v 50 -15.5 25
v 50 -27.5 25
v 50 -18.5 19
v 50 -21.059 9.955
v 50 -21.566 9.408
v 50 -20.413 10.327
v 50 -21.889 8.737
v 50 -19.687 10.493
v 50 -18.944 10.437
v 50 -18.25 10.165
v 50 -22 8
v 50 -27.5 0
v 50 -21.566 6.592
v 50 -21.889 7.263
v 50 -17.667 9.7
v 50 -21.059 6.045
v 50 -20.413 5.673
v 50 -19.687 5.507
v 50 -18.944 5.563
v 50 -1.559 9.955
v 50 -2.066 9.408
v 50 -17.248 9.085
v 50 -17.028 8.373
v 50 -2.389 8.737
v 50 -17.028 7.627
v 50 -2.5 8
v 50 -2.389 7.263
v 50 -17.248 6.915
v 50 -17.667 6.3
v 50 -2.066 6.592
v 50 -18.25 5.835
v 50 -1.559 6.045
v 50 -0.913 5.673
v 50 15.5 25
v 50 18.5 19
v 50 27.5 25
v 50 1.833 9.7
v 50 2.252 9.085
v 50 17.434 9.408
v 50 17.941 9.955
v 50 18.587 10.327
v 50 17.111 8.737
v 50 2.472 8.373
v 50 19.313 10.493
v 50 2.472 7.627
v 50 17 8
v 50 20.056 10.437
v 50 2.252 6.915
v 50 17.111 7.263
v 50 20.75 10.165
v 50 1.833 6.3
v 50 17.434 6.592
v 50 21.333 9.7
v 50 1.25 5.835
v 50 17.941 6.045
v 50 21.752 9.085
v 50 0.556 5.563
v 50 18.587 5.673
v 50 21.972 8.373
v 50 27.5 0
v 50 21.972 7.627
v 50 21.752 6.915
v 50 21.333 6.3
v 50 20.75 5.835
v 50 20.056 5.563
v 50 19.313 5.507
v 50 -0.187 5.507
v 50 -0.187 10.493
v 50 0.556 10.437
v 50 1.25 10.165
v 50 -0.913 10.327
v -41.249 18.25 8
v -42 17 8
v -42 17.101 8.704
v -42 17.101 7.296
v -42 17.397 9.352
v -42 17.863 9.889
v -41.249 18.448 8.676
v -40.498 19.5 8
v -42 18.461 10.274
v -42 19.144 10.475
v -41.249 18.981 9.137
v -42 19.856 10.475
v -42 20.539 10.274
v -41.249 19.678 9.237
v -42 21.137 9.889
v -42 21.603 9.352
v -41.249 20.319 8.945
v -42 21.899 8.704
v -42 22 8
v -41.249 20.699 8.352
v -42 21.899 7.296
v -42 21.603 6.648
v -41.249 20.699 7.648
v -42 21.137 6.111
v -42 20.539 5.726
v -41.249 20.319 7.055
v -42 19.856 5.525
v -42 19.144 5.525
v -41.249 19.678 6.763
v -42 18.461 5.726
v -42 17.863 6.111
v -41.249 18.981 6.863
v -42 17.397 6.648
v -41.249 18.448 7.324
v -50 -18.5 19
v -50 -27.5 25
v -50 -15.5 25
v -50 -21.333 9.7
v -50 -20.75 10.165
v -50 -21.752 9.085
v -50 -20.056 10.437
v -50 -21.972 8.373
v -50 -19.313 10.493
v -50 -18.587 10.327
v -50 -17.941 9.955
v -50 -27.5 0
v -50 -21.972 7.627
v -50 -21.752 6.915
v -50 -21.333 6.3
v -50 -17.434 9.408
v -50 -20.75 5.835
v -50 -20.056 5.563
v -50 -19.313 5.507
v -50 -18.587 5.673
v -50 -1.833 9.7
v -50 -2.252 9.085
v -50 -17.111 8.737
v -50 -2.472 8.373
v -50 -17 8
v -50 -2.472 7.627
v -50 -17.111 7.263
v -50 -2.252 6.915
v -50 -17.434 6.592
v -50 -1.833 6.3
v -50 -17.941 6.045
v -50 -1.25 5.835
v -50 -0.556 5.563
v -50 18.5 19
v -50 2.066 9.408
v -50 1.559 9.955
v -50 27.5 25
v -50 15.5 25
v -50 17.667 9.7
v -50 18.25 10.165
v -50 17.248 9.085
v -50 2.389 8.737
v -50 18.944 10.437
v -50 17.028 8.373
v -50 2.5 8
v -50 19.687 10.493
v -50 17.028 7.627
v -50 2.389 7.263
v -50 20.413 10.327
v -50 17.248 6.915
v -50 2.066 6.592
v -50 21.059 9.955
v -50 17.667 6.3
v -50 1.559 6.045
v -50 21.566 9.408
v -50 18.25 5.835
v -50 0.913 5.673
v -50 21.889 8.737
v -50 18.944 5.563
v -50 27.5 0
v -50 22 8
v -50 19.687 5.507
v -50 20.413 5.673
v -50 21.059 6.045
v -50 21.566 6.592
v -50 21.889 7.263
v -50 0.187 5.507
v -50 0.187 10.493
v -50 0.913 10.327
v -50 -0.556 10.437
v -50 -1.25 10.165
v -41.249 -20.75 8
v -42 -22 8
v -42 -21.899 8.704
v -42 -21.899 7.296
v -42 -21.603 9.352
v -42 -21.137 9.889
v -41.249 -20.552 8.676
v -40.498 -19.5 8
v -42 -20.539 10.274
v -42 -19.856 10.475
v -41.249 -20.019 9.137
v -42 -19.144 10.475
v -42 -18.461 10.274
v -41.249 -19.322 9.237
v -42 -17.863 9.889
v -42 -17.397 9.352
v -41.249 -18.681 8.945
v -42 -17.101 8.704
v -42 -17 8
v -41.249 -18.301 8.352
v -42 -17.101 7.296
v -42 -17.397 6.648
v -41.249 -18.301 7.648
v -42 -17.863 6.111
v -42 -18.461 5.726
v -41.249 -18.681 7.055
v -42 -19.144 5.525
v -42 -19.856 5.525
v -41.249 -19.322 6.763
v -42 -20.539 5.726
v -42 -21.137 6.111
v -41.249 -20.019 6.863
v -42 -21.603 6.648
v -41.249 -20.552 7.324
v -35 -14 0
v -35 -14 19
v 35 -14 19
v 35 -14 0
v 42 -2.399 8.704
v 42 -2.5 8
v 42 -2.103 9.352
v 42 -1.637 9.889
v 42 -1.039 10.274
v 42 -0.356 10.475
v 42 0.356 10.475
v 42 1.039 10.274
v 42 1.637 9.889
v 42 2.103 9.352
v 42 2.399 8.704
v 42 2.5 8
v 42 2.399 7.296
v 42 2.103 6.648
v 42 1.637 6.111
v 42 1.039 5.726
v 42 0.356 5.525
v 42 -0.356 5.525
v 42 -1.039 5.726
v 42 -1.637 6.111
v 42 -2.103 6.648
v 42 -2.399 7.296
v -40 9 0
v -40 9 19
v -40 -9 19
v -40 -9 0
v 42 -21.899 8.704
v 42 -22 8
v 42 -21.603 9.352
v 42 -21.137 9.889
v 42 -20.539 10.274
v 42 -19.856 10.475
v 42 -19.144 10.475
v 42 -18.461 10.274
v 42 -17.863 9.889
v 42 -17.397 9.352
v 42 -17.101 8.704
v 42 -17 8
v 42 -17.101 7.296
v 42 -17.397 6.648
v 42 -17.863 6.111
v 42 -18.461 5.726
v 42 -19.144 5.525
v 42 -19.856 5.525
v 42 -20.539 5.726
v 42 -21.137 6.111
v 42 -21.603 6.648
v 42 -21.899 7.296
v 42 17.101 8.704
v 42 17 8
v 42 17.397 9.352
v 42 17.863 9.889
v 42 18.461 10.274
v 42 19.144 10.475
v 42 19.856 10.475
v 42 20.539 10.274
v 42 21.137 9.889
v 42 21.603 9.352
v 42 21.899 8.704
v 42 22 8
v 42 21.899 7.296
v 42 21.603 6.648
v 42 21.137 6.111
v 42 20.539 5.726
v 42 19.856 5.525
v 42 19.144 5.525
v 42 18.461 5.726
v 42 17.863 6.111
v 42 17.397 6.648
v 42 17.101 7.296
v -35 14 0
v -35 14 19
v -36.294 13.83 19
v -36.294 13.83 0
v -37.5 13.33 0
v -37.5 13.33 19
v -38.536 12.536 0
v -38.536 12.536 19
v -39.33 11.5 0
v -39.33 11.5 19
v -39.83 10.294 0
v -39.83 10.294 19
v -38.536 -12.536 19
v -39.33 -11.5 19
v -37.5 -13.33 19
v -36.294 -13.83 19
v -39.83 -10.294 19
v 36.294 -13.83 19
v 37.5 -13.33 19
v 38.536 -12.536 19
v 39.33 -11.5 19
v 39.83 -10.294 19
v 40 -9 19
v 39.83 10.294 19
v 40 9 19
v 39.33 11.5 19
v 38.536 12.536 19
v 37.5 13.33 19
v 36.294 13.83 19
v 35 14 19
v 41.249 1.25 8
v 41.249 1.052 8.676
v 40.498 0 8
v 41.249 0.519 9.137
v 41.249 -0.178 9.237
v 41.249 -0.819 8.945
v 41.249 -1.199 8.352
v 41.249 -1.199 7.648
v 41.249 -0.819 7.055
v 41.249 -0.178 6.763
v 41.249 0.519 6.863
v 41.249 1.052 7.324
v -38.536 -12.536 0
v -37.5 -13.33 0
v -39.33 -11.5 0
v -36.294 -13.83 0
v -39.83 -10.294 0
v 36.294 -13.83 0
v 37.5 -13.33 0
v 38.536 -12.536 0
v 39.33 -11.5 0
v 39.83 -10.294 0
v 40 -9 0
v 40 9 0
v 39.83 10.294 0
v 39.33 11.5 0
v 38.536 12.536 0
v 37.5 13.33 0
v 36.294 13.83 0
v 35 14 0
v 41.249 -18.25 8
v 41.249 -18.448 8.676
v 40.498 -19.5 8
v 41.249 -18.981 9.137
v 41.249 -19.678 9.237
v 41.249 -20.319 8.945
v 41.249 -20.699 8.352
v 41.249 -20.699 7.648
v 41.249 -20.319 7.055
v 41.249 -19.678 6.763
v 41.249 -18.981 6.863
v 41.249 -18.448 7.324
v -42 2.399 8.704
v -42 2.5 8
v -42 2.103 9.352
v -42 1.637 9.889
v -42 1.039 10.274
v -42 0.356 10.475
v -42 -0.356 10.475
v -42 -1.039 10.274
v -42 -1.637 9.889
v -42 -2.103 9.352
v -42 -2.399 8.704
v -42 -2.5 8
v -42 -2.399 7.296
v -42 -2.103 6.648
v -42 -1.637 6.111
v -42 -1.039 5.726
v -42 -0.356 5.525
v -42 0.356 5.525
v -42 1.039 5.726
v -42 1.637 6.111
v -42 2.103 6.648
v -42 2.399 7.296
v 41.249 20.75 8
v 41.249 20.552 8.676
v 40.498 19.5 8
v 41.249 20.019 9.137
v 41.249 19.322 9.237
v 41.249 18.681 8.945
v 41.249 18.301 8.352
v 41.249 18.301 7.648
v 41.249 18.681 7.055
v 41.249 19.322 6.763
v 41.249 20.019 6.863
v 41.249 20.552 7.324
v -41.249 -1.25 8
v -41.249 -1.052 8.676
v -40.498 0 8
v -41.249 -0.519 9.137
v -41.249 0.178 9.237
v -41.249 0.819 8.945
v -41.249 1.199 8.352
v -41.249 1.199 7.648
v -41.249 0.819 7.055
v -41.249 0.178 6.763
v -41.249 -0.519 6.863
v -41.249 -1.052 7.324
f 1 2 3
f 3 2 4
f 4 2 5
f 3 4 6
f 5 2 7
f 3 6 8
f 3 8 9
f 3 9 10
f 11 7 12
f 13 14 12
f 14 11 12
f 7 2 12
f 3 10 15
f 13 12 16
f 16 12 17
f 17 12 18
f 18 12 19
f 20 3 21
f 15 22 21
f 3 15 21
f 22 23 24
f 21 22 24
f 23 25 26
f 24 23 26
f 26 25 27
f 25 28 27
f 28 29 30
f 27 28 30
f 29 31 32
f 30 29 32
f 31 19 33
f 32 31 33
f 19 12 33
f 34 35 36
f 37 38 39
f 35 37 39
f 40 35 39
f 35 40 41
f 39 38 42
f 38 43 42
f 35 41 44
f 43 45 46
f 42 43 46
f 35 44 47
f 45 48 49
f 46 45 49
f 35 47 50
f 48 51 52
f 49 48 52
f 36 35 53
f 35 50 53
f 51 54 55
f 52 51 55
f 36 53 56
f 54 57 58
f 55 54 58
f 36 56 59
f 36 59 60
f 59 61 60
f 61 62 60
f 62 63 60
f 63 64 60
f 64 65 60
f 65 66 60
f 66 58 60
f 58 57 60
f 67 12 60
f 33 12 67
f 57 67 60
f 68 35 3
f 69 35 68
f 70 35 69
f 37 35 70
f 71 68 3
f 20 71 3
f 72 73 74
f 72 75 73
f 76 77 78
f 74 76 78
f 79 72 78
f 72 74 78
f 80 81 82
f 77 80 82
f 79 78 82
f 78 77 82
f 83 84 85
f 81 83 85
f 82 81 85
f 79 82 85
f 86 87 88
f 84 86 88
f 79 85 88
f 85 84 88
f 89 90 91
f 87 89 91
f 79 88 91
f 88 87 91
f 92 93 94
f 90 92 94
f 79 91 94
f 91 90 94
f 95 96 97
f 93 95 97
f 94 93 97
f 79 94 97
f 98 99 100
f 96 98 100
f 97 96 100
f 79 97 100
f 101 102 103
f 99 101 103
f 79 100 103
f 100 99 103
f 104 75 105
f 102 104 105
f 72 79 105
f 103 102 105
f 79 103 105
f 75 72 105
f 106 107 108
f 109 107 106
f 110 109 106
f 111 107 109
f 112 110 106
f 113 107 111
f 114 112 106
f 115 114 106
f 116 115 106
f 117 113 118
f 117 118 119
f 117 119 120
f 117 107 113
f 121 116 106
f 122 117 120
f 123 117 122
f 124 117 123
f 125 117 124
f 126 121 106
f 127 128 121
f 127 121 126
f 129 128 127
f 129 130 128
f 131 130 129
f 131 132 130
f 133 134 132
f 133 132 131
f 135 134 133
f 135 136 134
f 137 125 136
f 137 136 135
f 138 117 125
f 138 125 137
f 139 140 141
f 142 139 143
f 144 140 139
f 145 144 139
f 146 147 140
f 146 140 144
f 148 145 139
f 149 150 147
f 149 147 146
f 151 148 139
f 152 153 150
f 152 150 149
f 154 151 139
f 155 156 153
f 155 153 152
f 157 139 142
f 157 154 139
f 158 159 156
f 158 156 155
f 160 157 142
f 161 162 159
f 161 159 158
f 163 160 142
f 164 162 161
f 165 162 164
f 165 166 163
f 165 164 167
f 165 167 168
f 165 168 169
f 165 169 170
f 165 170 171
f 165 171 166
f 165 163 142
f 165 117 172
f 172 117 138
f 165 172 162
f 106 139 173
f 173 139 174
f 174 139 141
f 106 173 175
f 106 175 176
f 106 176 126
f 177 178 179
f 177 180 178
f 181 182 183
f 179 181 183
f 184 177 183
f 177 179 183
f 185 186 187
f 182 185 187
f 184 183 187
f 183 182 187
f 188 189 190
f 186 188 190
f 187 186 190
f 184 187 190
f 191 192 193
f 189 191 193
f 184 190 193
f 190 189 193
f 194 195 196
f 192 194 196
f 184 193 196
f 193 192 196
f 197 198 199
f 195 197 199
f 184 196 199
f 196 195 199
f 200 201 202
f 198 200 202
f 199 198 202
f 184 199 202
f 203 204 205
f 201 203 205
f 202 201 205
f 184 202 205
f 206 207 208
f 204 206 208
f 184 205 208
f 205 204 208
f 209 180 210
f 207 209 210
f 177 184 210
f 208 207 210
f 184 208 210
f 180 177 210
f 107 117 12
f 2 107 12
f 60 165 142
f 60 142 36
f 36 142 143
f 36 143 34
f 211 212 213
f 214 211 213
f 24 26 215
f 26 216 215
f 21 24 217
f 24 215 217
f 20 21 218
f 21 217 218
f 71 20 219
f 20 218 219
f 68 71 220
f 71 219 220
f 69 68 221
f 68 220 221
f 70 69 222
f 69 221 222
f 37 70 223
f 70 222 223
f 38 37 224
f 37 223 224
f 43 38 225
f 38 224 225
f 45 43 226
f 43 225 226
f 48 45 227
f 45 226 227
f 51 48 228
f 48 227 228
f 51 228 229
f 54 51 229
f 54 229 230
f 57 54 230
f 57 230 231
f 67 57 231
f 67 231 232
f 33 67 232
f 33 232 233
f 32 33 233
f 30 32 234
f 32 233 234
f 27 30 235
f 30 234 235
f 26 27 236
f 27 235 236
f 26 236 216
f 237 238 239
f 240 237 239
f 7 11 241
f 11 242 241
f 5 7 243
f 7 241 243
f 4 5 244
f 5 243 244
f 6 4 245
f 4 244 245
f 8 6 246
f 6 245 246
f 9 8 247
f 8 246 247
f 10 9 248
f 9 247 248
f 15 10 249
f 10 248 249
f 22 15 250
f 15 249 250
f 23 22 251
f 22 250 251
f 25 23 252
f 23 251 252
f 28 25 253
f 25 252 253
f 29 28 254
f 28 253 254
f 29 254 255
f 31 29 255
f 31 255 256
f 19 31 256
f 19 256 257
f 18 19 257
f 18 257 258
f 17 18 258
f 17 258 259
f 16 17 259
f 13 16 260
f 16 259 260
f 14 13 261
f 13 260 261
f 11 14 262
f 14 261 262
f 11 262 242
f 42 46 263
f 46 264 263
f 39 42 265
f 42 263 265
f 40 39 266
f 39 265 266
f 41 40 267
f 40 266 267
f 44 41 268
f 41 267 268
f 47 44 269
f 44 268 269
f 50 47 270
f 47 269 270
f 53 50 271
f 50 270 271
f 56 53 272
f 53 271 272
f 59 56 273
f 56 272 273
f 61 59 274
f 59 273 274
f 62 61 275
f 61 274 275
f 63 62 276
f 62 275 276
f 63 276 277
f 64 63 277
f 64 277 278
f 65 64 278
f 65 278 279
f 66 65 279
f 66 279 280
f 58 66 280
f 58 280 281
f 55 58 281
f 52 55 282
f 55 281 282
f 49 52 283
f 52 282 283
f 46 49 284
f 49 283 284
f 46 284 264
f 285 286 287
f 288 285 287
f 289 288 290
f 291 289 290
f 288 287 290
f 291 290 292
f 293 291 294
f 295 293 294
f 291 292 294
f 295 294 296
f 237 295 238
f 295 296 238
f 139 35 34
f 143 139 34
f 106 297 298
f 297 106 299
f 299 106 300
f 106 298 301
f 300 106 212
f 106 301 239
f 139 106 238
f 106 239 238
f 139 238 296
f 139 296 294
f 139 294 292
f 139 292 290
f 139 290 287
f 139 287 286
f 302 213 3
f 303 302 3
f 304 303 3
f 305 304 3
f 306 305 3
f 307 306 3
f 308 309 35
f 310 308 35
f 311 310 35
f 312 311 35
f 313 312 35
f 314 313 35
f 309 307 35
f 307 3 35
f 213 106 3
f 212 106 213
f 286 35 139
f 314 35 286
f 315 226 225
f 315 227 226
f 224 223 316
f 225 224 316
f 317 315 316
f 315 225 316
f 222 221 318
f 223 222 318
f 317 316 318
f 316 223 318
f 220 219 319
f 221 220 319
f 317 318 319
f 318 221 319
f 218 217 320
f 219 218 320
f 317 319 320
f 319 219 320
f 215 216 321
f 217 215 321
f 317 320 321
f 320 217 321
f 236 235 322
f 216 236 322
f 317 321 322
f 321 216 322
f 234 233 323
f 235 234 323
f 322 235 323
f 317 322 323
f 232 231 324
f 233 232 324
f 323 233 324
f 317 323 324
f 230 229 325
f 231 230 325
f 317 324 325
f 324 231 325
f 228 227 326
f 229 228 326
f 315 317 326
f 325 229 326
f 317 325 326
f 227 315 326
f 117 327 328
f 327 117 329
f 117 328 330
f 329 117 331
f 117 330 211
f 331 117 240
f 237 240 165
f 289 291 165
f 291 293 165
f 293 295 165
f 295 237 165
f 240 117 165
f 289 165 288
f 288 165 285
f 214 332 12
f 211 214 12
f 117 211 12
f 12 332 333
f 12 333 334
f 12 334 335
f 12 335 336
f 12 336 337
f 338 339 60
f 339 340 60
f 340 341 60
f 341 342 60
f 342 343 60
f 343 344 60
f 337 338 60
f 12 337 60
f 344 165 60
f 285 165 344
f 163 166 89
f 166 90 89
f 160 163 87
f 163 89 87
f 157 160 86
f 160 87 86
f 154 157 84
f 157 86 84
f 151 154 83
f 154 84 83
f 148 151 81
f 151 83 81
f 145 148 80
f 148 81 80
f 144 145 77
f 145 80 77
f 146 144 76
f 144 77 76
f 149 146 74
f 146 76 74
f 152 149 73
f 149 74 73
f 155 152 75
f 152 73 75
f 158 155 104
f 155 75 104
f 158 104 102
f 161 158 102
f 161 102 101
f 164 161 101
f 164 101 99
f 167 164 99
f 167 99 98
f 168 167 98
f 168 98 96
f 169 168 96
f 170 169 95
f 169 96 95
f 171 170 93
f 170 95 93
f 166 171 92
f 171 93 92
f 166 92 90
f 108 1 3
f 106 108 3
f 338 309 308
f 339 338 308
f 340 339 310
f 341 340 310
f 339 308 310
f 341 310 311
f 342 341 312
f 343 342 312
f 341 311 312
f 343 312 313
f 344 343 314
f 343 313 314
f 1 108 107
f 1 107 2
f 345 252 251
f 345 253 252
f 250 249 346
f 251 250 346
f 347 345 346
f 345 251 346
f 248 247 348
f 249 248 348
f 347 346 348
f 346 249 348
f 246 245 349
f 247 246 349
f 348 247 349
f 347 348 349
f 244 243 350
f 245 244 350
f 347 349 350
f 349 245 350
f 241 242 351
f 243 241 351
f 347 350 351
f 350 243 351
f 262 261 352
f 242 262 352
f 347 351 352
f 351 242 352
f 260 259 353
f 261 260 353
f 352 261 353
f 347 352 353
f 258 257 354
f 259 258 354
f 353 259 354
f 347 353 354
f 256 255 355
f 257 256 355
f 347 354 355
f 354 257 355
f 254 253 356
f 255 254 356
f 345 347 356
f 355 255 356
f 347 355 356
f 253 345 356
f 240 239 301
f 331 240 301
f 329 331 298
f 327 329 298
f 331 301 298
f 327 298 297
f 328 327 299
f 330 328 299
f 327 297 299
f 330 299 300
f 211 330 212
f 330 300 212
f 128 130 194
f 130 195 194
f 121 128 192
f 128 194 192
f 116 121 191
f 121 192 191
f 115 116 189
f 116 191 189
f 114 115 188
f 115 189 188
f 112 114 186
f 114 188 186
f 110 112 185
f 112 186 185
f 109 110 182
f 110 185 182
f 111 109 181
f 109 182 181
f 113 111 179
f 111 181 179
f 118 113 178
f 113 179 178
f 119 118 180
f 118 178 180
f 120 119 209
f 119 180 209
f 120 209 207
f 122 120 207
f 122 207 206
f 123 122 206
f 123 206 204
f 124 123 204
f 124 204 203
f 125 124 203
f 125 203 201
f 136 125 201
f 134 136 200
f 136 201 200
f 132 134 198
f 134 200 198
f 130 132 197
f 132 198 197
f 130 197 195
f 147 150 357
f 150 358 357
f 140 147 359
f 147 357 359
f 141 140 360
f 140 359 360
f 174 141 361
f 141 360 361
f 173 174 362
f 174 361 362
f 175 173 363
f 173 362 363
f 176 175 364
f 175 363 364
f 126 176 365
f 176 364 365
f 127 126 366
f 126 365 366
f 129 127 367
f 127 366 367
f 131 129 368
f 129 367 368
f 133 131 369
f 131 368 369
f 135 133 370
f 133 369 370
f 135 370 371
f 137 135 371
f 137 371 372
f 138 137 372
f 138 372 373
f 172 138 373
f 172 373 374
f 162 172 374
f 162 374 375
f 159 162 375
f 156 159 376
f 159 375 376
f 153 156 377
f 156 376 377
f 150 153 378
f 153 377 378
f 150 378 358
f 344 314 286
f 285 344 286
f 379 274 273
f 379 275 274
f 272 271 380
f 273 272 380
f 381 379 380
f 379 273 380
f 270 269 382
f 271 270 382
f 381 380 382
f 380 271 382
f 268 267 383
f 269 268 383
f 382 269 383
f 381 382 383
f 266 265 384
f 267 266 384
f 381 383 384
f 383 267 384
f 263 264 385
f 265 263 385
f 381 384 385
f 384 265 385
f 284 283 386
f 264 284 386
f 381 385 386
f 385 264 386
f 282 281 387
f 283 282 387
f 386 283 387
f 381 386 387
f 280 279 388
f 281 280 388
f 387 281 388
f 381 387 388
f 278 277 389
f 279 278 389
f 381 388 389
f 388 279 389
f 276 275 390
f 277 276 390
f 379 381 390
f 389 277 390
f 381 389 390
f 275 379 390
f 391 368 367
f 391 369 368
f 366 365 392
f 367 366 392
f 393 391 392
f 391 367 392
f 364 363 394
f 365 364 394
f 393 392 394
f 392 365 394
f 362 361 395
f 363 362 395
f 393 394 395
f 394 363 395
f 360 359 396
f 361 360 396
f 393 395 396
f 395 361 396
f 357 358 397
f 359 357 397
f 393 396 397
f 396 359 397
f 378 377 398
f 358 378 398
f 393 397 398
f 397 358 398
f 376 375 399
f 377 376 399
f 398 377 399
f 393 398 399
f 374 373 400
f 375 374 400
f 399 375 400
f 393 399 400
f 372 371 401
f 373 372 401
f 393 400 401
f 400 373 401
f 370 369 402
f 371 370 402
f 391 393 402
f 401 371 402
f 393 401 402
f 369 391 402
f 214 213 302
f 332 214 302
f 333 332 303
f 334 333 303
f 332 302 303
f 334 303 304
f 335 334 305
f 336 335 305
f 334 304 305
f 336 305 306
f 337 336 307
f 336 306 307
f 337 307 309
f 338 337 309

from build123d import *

# Parameters (mm, degrees)
F0_W     = 100
F0_H     = 55
F1_DEPTH = 25
F3_DEPTH = 100
F5_DEPTH = 19
F7_D     = 5
F7_DEPTH = 8
F7_TIP   = 1.5021515476
F9_D     = 5
F9_DEPTH = 8
F9_TIP   = 1.5021515476


with BuildPart() as f1:
    # F0 (on Top) → F1 (new body)
    with BuildSketch(Plane.XY):
        Rectangle(F0_W, F0_H)
    extrude(amount=F1_DEPTH)

    # F2 (on face) → F3 (cut, through all)
    with BuildSketch(Plane.YZ.offset(50)):
        Polygon((15.5, 25), (-15.5, 25), (-18.5, 19), (18.5, 19), align=None)
    extrude(amount=-F3_DEPTH, mode=Mode.SUBTRACT)

    # F4 (on face) → F5 (cut, through all)
    with BuildSketch(Plane.XY.offset(19)):
        with BuildLine():
            Line((35, 14), (-35, 14))
            ThreePointArc((-35, 14), (-38.5355339059, 12.5355339059), (-40, 9))
            Line((-40, 9), (-40, -9))
            ThreePointArc((-40, -9), (-38.5355339059, -12.5355339059), (-35, -14))
            Line((-35, -14), (35, -14))
            ThreePointArc((35, -14), (38.5355339059, -12.5355339059), (40, -9))
            Line((40, -9), (40, 9))
            ThreePointArc((40, 9), (38.5355339059, 12.5355339059), (35, 14))
        make_face()
    extrude(amount=-F5_DEPTH, mode=Mode.SUBTRACT)

    # F7
    with Locations(Plane.YZ.offset(50)):
        with Locations((19.5, 8), (0, 8), (-19.5, 8)):
            Hole(F7_D / 2, depth=F7_DEPTH)
            with Locations((0, 0, -(F7_DEPTH + F7_TIP / 2))):  # 118° drill point
                Cone(0, F7_D / 2, F7_TIP, mode=Mode.SUBTRACT)

    # F9
    with Locations(Plane(origin=(-50, 0, 0), x_dir=(0, -1, 0), z_dir=(-1, 0, 0))):
        with Locations((-19.5, 8), (0, 8), (19.5, 8)):
            Hole(F9_D / 2, depth=F9_DEPTH)
            with Locations((0, 0, -(F9_DEPTH + F9_TIP / 2))):  # 118° drill point
                Cone(0, F9_D / 2, F9_TIP, mode=Mode.SUBTRACT)


solid = f1.part
